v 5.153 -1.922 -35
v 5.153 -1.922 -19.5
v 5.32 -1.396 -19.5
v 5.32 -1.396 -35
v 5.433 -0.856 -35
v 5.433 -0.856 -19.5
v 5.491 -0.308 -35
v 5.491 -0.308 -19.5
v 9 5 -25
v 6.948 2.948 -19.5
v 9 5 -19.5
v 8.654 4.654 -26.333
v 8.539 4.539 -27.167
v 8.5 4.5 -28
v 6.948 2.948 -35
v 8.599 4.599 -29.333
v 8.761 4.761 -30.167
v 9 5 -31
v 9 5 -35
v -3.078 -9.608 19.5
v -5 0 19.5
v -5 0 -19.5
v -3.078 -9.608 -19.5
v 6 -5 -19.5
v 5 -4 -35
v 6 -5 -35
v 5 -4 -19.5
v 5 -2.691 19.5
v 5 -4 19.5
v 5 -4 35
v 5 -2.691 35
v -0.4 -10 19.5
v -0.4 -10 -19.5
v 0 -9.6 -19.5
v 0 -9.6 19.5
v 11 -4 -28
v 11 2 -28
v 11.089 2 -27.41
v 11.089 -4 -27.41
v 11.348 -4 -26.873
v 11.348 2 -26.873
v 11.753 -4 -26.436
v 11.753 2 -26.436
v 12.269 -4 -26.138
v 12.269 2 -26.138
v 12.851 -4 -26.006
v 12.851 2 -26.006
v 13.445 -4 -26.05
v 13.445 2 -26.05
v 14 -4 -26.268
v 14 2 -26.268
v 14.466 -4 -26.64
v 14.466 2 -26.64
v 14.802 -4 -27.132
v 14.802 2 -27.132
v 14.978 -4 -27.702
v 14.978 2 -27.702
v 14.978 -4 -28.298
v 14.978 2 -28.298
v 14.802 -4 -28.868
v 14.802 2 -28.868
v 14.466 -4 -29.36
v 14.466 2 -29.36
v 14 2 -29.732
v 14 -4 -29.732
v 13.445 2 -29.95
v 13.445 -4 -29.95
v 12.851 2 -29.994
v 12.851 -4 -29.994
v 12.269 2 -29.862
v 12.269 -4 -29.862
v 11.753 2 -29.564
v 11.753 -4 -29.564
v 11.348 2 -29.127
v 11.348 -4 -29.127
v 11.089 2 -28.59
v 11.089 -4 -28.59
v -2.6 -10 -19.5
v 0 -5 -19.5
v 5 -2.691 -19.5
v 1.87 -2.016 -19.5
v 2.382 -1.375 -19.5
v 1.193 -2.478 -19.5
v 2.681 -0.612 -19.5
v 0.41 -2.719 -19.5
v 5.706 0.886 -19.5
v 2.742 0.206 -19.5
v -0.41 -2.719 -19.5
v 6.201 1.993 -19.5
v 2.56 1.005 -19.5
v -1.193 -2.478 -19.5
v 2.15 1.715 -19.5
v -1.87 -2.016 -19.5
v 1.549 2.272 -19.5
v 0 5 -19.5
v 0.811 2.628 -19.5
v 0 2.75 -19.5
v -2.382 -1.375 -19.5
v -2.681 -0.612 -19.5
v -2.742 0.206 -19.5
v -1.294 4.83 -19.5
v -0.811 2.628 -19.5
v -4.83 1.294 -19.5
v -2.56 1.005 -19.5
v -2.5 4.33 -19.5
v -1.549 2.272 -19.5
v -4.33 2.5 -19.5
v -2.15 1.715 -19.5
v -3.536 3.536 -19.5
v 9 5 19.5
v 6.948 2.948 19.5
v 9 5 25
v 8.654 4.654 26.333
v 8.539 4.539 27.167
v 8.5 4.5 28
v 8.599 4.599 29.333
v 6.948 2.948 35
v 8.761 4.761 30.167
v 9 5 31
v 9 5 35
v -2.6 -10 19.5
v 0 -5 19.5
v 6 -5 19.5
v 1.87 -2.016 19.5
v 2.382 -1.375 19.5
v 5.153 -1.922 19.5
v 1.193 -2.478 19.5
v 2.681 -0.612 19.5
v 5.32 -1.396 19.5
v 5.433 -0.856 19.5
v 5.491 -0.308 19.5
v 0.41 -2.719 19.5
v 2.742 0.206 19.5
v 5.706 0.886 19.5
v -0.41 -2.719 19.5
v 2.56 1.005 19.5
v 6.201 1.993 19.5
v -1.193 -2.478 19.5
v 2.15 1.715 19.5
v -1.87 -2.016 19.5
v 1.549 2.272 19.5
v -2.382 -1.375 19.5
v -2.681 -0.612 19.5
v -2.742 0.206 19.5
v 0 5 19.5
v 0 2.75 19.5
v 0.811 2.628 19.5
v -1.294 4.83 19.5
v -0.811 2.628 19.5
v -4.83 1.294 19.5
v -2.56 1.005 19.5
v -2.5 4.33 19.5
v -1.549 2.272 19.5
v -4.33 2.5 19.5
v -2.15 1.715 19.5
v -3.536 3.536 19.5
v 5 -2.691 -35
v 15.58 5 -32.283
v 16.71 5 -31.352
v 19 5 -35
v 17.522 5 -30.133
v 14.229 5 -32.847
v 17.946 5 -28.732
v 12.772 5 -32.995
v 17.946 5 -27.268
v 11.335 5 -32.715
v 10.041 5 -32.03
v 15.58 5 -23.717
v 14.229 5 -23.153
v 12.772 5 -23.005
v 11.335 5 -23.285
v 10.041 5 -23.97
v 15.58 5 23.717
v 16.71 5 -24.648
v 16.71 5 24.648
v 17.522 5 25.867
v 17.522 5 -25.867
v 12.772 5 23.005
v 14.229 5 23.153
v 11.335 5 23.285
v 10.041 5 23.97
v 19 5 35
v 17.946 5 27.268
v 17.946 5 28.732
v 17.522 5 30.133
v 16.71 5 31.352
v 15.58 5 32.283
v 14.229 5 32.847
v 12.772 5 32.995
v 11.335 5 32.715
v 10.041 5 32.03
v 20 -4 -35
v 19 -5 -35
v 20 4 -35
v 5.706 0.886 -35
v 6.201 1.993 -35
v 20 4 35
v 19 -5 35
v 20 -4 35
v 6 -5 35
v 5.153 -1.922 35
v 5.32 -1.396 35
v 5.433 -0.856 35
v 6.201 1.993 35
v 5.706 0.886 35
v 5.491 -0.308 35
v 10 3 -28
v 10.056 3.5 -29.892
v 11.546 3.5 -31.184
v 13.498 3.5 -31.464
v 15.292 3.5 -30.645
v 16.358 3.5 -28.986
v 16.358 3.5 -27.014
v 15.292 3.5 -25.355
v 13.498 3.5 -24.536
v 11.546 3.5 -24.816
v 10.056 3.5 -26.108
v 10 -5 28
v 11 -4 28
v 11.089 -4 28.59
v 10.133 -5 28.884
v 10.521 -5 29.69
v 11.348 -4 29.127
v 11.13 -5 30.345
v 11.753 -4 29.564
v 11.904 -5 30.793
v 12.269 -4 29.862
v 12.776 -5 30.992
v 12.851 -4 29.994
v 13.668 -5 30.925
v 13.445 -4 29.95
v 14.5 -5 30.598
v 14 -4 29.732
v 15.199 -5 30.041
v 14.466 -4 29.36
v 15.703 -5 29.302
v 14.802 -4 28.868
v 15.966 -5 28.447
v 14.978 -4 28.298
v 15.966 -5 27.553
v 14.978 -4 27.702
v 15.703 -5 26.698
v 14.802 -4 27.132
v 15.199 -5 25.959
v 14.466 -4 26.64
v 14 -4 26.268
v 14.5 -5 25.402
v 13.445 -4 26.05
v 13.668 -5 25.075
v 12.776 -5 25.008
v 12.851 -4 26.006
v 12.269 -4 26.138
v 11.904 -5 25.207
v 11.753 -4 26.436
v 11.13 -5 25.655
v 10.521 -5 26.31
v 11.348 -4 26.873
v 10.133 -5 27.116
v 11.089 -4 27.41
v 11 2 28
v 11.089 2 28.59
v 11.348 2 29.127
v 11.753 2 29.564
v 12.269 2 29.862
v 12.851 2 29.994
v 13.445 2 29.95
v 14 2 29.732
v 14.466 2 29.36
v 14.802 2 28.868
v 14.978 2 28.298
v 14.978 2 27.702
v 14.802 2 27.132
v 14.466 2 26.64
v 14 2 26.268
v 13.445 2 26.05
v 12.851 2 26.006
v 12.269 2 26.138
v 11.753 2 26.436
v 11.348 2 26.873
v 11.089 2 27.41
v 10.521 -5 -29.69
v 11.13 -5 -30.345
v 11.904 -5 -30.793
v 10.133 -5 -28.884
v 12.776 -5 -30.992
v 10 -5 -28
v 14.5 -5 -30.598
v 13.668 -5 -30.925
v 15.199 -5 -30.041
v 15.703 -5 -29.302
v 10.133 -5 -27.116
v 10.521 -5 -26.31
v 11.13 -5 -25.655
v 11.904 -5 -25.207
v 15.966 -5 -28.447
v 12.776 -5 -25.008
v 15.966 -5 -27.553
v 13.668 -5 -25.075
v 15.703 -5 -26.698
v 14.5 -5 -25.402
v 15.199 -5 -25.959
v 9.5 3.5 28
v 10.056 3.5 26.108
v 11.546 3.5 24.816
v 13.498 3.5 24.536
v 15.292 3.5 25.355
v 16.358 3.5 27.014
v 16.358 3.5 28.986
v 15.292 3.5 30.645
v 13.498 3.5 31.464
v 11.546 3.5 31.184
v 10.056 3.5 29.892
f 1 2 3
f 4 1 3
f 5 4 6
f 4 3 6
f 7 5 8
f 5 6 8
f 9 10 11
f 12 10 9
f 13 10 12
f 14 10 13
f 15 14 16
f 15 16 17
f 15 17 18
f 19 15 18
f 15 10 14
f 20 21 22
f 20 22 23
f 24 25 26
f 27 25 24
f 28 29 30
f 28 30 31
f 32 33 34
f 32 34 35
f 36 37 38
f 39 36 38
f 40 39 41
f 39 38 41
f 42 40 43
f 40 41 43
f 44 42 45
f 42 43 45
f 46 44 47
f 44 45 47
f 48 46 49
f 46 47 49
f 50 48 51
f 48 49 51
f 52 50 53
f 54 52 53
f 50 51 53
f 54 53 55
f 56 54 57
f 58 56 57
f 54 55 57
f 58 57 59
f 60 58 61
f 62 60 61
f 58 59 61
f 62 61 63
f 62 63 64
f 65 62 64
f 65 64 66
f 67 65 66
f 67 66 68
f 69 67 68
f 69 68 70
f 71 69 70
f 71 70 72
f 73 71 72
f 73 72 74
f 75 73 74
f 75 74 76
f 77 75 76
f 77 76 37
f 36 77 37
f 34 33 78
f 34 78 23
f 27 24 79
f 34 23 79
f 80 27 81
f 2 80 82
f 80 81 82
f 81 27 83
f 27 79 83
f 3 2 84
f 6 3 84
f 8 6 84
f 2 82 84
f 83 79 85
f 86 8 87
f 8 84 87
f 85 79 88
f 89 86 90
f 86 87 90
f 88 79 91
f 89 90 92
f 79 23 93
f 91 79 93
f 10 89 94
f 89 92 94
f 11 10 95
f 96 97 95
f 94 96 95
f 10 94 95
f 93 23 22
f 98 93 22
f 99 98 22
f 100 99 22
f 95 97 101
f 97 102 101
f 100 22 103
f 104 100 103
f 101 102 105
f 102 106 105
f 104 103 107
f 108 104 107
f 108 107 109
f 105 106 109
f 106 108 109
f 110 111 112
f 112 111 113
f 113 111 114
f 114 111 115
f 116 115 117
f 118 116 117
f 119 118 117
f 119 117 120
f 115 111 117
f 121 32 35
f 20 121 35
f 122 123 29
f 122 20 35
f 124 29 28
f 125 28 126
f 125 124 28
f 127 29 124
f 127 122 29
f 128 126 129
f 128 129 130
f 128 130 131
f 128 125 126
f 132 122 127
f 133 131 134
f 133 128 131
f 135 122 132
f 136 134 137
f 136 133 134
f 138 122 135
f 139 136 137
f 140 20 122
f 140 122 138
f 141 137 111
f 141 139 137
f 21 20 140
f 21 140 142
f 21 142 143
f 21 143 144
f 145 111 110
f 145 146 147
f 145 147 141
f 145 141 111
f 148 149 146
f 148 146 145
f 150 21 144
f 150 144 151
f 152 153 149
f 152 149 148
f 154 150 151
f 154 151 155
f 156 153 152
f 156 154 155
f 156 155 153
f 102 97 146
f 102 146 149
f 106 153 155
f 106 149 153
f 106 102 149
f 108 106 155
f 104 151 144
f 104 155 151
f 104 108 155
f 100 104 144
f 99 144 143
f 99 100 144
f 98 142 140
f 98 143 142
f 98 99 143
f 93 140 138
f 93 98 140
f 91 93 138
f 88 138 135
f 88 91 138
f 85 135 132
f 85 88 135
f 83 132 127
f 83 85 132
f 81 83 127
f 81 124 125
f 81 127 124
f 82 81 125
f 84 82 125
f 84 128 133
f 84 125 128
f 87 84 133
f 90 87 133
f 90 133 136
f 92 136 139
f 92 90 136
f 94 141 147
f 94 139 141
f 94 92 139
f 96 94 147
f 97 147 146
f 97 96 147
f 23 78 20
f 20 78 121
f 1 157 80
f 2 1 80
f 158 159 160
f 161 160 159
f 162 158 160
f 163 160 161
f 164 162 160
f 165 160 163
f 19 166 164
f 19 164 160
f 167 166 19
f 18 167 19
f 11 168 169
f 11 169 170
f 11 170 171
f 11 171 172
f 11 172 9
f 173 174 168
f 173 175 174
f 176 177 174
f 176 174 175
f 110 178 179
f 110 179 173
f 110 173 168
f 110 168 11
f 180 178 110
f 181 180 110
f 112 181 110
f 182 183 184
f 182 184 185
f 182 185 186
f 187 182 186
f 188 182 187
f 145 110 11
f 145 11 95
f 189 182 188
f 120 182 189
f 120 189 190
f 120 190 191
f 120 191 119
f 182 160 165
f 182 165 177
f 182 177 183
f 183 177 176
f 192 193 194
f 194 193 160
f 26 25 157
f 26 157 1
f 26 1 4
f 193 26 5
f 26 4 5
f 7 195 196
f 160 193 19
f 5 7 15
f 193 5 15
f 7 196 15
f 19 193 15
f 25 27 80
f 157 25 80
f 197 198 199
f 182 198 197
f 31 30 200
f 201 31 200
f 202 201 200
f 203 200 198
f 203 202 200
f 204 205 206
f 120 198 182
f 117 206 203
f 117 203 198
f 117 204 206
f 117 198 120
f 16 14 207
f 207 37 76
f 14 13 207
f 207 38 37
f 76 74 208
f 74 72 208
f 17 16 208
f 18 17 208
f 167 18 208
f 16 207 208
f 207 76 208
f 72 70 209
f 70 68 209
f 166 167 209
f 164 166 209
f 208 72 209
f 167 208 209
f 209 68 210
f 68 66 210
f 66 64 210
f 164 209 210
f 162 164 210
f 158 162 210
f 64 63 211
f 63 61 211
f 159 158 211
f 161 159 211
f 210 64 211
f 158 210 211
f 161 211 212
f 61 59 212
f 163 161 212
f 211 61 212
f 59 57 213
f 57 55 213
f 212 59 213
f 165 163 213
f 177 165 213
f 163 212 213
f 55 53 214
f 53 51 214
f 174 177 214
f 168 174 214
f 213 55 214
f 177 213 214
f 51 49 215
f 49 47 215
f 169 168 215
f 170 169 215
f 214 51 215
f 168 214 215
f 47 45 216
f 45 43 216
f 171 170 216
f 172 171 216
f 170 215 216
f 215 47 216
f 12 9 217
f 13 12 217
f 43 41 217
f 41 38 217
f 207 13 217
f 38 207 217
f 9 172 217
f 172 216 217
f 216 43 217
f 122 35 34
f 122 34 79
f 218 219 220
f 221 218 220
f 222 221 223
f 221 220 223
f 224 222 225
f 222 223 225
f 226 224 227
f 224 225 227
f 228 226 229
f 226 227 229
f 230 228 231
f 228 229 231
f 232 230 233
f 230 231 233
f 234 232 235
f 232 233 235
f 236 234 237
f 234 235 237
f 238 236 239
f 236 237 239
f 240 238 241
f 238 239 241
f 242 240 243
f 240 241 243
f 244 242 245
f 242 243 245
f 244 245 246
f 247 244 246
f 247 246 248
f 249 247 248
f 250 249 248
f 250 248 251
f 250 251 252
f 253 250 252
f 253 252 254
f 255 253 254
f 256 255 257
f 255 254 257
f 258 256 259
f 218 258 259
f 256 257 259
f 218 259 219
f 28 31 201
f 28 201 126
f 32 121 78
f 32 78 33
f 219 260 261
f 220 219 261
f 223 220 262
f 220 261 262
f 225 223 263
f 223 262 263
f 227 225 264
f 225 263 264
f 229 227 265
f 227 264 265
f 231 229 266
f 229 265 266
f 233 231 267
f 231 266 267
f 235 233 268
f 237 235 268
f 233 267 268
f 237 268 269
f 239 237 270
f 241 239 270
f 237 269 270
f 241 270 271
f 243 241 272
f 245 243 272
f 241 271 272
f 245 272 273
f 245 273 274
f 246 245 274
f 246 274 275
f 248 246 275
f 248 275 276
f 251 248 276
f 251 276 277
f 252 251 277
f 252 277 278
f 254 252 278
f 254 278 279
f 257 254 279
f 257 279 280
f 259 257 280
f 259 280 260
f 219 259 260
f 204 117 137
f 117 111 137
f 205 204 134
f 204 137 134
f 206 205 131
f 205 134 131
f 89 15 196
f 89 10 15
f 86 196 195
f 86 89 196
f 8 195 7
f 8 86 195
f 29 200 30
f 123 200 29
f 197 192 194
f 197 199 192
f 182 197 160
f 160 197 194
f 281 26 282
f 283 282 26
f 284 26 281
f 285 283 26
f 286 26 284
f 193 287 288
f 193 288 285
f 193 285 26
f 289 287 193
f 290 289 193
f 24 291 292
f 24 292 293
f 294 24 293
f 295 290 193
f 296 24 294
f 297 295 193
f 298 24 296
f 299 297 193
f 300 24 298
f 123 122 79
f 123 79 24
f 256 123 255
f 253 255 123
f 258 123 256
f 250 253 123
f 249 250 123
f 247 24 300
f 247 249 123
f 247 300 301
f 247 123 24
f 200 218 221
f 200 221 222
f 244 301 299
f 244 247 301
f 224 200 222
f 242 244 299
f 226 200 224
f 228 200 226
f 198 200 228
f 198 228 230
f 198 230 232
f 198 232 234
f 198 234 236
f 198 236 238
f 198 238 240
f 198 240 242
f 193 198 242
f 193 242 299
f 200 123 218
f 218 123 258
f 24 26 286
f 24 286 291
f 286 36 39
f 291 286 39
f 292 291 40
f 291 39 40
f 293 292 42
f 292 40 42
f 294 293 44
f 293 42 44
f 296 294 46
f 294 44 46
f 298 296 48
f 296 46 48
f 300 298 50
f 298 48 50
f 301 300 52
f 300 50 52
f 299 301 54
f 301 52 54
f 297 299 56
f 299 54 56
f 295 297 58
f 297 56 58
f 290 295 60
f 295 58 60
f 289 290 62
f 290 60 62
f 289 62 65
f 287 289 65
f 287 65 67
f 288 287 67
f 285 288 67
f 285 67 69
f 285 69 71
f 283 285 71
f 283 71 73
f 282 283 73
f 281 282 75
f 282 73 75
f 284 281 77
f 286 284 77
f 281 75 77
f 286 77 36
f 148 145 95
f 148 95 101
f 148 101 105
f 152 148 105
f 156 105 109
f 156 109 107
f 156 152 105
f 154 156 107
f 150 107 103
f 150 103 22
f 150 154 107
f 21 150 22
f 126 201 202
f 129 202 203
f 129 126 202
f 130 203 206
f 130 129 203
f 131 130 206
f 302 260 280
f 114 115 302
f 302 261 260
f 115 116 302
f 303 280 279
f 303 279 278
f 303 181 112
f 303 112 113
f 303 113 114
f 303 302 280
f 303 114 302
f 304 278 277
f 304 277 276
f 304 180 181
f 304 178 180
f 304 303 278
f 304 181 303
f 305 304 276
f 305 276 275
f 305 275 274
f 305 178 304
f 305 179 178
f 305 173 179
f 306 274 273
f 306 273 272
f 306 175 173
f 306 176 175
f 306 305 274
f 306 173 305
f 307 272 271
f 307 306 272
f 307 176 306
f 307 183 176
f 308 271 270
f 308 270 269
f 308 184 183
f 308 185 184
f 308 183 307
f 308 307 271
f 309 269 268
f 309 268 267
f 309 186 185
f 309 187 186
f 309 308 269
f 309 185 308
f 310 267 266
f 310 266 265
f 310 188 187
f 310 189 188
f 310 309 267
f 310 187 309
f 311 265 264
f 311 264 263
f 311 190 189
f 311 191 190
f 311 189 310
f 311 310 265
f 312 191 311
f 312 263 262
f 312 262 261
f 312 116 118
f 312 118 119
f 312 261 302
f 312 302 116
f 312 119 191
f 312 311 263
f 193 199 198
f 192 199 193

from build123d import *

# Parameters (mm, degrees)
SKETCH010_R             = 2.75
PAD005_DEPTH            = 35
SKETCH011_W             = 20
SKETCH011_H             = 10
POCKET005_DEPTH         = 167.158509
CHAMFER010_SIZE         = 0.4
SKETCH012_R             = 5.5
POCKET006_DEPTH         = 167.158509
CHAMFER011_SIZE         = 0.4
CHAMFER012_SIZE         = 1
SKETCH013_R             = 2
POCKET007_DEPTH         = 10.001
POCKET007_DEPTH_BACK    = 5.001
CHAMFER013_SIZE         = 1
CHAMFER020_SIZE         = 3
POCKET010_DEPTH         = 15.5
FILLET006_R             = 5
BODY004_PLACEMENT_ANGLE = 90


with BuildPart() as part:
    # Sketch010 → Pad005 (new body, symmetric)
    with BuildSketch(Plane.XY):
        with BuildLine():
            ThreePointArc((5, 0), (3.535534, 3.535534), (0, 5))
            Line((0, 5), (-10, 3))
            Line((-10, 3), (-10, 0))
            Line((-10, 0), (-5, 0))
            Line((-5, 0), (-5, -20))
            Line((-5, -20), (5, -20))
            Line((5, -20), (5, 0))
        make_face()
        Circle(SKETCH010_R, mode=Mode.SUBTRACT)
    extrude(amount=PAD005_DEPTH, both=True)

    # Sketch011 → Pocket005 (cut, through all)
    with BuildSketch(Plane.XY.offset(19.5)):
        with Locations((-5, 0)):
            Rectangle(SKETCH011_W, SKETCH011_H)
    pocket005 = extrude(amount=POCKET005_DEPTH, mode=Mode.SUBTRACT)

    # Mirrored: Pocket005 across XY
    add(pocket005.mirror(Plane.XY), mode=Mode.SUBTRACT)

    # Chamfer010
    chamfer010_edges = [part.edges().sort_by_distance(p)[0] for p in [
        (-10, 3, 0),
        (-10, 0, 0),
    ]]
    chamfer(chamfer010_edges, length=CHAMFER010_SIZE)

    # Sketch012 (on Face12 of Chamfer010) → Pocket006 (cut, through all)
    with BuildSketch(Plane.XY.offset(19.5)):
        Circle(SKETCH012_R)
    pocket006 = extrude(amount=POCKET006_DEPTH, mode=Mode.SUBTRACT)

    # Mirrored001: Pocket006 across XY
    add(pocket006.mirror(Plane.XY), mode=Mode.SUBTRACT)

    # Chamfer011
    chamfer011_edges = [part.edges().sort_by_distance(p)[0] for p in [
        (-2.291288, -5, -27.25),
        (2.291288, -5, -27.25),
        (2.291288, -5, 27.25),
        (-2.291288, -5, 27.25),
    ]]
    chamfer(chamfer011_edges, length=CHAMFER011_SIZE)

    # Chamfer012
    chamfer012_edges = [part.edges().sort_by_distance(p)[0] for p in [
        (-5, -5, 27.25),
        (5, -5, 27.25),
        (5, -5, -27.25),
        (-5, -5, -27.25),
        (-5, -20, 0),
        (5, -20, 0),
    ]]
    chamfer(chamfer012_edges, length=CHAMFER012_SIZE)

    # Sketch013 → Pocket007 (cut, two sides)
    with BuildSketch(Plane.YZ) as pocket007_sk:
        with Locations((-13, 28)):
            Circle(SKETCH013_R)
        with Locations((-13, -28)):
            Circle(SKETCH013_R)
    extrude(amount=-POCKET007_DEPTH, mode=Mode.SUBTRACT)
    extrude(pocket007_sk.sketch, amount=POCKET007_DEPTH_BACK, mode=Mode.SUBTRACT)

    # Chamfer013
    chamfer013_edges = [part.edges().sort_by_distance(p)[0] for p in [
        (-5, -15, -28),
        (-5, -15, 28),
    ]]
    chamfer(chamfer013_edges, length=CHAMFER013_SIZE)

    # Chamfer020
    chamfer020_edges = [part.edges().sort_by_distance(p)[0] for p in [
        (5, -15, -28),
        (5, -15, 28),
    ]]
    chamfer(chamfer020_edges, length=CHAMFER020_SIZE)

    # Sketch017 (on Face9 of Chamfer020) → Pocket010 (cut)
    with BuildSketch(Plane.XY.offset(35)):
        Polygon((5, -5), (1, -5), (5, -9), align=None)
    pocket010 = extrude(amount=-POCKET010_DEPTH, mode=Mode.SUBTRACT)

    # Mirrored002: Pocket010 across XY
    add(pocket010.mirror(Plane.XY), mode=Mode.SUBTRACT)

    # Fillet006
    fillet006_edges = [part.edges().sort_by_distance(p)[0] for p in [
        (1.335416, -5.335416, 27.25),
        (1.335416, -5.335416, -27.25),
    ]]
    fillet(fillet006_edges, radius=FILLET006_R)


with BuildPart() as part_1:
    # Body004 placement: moved
    add(part.part.rotate(Axis((0, 0, 0), (0, 0, 1)), BODY004_PLACEMENT_ANGLE))


solid = part_1.part
